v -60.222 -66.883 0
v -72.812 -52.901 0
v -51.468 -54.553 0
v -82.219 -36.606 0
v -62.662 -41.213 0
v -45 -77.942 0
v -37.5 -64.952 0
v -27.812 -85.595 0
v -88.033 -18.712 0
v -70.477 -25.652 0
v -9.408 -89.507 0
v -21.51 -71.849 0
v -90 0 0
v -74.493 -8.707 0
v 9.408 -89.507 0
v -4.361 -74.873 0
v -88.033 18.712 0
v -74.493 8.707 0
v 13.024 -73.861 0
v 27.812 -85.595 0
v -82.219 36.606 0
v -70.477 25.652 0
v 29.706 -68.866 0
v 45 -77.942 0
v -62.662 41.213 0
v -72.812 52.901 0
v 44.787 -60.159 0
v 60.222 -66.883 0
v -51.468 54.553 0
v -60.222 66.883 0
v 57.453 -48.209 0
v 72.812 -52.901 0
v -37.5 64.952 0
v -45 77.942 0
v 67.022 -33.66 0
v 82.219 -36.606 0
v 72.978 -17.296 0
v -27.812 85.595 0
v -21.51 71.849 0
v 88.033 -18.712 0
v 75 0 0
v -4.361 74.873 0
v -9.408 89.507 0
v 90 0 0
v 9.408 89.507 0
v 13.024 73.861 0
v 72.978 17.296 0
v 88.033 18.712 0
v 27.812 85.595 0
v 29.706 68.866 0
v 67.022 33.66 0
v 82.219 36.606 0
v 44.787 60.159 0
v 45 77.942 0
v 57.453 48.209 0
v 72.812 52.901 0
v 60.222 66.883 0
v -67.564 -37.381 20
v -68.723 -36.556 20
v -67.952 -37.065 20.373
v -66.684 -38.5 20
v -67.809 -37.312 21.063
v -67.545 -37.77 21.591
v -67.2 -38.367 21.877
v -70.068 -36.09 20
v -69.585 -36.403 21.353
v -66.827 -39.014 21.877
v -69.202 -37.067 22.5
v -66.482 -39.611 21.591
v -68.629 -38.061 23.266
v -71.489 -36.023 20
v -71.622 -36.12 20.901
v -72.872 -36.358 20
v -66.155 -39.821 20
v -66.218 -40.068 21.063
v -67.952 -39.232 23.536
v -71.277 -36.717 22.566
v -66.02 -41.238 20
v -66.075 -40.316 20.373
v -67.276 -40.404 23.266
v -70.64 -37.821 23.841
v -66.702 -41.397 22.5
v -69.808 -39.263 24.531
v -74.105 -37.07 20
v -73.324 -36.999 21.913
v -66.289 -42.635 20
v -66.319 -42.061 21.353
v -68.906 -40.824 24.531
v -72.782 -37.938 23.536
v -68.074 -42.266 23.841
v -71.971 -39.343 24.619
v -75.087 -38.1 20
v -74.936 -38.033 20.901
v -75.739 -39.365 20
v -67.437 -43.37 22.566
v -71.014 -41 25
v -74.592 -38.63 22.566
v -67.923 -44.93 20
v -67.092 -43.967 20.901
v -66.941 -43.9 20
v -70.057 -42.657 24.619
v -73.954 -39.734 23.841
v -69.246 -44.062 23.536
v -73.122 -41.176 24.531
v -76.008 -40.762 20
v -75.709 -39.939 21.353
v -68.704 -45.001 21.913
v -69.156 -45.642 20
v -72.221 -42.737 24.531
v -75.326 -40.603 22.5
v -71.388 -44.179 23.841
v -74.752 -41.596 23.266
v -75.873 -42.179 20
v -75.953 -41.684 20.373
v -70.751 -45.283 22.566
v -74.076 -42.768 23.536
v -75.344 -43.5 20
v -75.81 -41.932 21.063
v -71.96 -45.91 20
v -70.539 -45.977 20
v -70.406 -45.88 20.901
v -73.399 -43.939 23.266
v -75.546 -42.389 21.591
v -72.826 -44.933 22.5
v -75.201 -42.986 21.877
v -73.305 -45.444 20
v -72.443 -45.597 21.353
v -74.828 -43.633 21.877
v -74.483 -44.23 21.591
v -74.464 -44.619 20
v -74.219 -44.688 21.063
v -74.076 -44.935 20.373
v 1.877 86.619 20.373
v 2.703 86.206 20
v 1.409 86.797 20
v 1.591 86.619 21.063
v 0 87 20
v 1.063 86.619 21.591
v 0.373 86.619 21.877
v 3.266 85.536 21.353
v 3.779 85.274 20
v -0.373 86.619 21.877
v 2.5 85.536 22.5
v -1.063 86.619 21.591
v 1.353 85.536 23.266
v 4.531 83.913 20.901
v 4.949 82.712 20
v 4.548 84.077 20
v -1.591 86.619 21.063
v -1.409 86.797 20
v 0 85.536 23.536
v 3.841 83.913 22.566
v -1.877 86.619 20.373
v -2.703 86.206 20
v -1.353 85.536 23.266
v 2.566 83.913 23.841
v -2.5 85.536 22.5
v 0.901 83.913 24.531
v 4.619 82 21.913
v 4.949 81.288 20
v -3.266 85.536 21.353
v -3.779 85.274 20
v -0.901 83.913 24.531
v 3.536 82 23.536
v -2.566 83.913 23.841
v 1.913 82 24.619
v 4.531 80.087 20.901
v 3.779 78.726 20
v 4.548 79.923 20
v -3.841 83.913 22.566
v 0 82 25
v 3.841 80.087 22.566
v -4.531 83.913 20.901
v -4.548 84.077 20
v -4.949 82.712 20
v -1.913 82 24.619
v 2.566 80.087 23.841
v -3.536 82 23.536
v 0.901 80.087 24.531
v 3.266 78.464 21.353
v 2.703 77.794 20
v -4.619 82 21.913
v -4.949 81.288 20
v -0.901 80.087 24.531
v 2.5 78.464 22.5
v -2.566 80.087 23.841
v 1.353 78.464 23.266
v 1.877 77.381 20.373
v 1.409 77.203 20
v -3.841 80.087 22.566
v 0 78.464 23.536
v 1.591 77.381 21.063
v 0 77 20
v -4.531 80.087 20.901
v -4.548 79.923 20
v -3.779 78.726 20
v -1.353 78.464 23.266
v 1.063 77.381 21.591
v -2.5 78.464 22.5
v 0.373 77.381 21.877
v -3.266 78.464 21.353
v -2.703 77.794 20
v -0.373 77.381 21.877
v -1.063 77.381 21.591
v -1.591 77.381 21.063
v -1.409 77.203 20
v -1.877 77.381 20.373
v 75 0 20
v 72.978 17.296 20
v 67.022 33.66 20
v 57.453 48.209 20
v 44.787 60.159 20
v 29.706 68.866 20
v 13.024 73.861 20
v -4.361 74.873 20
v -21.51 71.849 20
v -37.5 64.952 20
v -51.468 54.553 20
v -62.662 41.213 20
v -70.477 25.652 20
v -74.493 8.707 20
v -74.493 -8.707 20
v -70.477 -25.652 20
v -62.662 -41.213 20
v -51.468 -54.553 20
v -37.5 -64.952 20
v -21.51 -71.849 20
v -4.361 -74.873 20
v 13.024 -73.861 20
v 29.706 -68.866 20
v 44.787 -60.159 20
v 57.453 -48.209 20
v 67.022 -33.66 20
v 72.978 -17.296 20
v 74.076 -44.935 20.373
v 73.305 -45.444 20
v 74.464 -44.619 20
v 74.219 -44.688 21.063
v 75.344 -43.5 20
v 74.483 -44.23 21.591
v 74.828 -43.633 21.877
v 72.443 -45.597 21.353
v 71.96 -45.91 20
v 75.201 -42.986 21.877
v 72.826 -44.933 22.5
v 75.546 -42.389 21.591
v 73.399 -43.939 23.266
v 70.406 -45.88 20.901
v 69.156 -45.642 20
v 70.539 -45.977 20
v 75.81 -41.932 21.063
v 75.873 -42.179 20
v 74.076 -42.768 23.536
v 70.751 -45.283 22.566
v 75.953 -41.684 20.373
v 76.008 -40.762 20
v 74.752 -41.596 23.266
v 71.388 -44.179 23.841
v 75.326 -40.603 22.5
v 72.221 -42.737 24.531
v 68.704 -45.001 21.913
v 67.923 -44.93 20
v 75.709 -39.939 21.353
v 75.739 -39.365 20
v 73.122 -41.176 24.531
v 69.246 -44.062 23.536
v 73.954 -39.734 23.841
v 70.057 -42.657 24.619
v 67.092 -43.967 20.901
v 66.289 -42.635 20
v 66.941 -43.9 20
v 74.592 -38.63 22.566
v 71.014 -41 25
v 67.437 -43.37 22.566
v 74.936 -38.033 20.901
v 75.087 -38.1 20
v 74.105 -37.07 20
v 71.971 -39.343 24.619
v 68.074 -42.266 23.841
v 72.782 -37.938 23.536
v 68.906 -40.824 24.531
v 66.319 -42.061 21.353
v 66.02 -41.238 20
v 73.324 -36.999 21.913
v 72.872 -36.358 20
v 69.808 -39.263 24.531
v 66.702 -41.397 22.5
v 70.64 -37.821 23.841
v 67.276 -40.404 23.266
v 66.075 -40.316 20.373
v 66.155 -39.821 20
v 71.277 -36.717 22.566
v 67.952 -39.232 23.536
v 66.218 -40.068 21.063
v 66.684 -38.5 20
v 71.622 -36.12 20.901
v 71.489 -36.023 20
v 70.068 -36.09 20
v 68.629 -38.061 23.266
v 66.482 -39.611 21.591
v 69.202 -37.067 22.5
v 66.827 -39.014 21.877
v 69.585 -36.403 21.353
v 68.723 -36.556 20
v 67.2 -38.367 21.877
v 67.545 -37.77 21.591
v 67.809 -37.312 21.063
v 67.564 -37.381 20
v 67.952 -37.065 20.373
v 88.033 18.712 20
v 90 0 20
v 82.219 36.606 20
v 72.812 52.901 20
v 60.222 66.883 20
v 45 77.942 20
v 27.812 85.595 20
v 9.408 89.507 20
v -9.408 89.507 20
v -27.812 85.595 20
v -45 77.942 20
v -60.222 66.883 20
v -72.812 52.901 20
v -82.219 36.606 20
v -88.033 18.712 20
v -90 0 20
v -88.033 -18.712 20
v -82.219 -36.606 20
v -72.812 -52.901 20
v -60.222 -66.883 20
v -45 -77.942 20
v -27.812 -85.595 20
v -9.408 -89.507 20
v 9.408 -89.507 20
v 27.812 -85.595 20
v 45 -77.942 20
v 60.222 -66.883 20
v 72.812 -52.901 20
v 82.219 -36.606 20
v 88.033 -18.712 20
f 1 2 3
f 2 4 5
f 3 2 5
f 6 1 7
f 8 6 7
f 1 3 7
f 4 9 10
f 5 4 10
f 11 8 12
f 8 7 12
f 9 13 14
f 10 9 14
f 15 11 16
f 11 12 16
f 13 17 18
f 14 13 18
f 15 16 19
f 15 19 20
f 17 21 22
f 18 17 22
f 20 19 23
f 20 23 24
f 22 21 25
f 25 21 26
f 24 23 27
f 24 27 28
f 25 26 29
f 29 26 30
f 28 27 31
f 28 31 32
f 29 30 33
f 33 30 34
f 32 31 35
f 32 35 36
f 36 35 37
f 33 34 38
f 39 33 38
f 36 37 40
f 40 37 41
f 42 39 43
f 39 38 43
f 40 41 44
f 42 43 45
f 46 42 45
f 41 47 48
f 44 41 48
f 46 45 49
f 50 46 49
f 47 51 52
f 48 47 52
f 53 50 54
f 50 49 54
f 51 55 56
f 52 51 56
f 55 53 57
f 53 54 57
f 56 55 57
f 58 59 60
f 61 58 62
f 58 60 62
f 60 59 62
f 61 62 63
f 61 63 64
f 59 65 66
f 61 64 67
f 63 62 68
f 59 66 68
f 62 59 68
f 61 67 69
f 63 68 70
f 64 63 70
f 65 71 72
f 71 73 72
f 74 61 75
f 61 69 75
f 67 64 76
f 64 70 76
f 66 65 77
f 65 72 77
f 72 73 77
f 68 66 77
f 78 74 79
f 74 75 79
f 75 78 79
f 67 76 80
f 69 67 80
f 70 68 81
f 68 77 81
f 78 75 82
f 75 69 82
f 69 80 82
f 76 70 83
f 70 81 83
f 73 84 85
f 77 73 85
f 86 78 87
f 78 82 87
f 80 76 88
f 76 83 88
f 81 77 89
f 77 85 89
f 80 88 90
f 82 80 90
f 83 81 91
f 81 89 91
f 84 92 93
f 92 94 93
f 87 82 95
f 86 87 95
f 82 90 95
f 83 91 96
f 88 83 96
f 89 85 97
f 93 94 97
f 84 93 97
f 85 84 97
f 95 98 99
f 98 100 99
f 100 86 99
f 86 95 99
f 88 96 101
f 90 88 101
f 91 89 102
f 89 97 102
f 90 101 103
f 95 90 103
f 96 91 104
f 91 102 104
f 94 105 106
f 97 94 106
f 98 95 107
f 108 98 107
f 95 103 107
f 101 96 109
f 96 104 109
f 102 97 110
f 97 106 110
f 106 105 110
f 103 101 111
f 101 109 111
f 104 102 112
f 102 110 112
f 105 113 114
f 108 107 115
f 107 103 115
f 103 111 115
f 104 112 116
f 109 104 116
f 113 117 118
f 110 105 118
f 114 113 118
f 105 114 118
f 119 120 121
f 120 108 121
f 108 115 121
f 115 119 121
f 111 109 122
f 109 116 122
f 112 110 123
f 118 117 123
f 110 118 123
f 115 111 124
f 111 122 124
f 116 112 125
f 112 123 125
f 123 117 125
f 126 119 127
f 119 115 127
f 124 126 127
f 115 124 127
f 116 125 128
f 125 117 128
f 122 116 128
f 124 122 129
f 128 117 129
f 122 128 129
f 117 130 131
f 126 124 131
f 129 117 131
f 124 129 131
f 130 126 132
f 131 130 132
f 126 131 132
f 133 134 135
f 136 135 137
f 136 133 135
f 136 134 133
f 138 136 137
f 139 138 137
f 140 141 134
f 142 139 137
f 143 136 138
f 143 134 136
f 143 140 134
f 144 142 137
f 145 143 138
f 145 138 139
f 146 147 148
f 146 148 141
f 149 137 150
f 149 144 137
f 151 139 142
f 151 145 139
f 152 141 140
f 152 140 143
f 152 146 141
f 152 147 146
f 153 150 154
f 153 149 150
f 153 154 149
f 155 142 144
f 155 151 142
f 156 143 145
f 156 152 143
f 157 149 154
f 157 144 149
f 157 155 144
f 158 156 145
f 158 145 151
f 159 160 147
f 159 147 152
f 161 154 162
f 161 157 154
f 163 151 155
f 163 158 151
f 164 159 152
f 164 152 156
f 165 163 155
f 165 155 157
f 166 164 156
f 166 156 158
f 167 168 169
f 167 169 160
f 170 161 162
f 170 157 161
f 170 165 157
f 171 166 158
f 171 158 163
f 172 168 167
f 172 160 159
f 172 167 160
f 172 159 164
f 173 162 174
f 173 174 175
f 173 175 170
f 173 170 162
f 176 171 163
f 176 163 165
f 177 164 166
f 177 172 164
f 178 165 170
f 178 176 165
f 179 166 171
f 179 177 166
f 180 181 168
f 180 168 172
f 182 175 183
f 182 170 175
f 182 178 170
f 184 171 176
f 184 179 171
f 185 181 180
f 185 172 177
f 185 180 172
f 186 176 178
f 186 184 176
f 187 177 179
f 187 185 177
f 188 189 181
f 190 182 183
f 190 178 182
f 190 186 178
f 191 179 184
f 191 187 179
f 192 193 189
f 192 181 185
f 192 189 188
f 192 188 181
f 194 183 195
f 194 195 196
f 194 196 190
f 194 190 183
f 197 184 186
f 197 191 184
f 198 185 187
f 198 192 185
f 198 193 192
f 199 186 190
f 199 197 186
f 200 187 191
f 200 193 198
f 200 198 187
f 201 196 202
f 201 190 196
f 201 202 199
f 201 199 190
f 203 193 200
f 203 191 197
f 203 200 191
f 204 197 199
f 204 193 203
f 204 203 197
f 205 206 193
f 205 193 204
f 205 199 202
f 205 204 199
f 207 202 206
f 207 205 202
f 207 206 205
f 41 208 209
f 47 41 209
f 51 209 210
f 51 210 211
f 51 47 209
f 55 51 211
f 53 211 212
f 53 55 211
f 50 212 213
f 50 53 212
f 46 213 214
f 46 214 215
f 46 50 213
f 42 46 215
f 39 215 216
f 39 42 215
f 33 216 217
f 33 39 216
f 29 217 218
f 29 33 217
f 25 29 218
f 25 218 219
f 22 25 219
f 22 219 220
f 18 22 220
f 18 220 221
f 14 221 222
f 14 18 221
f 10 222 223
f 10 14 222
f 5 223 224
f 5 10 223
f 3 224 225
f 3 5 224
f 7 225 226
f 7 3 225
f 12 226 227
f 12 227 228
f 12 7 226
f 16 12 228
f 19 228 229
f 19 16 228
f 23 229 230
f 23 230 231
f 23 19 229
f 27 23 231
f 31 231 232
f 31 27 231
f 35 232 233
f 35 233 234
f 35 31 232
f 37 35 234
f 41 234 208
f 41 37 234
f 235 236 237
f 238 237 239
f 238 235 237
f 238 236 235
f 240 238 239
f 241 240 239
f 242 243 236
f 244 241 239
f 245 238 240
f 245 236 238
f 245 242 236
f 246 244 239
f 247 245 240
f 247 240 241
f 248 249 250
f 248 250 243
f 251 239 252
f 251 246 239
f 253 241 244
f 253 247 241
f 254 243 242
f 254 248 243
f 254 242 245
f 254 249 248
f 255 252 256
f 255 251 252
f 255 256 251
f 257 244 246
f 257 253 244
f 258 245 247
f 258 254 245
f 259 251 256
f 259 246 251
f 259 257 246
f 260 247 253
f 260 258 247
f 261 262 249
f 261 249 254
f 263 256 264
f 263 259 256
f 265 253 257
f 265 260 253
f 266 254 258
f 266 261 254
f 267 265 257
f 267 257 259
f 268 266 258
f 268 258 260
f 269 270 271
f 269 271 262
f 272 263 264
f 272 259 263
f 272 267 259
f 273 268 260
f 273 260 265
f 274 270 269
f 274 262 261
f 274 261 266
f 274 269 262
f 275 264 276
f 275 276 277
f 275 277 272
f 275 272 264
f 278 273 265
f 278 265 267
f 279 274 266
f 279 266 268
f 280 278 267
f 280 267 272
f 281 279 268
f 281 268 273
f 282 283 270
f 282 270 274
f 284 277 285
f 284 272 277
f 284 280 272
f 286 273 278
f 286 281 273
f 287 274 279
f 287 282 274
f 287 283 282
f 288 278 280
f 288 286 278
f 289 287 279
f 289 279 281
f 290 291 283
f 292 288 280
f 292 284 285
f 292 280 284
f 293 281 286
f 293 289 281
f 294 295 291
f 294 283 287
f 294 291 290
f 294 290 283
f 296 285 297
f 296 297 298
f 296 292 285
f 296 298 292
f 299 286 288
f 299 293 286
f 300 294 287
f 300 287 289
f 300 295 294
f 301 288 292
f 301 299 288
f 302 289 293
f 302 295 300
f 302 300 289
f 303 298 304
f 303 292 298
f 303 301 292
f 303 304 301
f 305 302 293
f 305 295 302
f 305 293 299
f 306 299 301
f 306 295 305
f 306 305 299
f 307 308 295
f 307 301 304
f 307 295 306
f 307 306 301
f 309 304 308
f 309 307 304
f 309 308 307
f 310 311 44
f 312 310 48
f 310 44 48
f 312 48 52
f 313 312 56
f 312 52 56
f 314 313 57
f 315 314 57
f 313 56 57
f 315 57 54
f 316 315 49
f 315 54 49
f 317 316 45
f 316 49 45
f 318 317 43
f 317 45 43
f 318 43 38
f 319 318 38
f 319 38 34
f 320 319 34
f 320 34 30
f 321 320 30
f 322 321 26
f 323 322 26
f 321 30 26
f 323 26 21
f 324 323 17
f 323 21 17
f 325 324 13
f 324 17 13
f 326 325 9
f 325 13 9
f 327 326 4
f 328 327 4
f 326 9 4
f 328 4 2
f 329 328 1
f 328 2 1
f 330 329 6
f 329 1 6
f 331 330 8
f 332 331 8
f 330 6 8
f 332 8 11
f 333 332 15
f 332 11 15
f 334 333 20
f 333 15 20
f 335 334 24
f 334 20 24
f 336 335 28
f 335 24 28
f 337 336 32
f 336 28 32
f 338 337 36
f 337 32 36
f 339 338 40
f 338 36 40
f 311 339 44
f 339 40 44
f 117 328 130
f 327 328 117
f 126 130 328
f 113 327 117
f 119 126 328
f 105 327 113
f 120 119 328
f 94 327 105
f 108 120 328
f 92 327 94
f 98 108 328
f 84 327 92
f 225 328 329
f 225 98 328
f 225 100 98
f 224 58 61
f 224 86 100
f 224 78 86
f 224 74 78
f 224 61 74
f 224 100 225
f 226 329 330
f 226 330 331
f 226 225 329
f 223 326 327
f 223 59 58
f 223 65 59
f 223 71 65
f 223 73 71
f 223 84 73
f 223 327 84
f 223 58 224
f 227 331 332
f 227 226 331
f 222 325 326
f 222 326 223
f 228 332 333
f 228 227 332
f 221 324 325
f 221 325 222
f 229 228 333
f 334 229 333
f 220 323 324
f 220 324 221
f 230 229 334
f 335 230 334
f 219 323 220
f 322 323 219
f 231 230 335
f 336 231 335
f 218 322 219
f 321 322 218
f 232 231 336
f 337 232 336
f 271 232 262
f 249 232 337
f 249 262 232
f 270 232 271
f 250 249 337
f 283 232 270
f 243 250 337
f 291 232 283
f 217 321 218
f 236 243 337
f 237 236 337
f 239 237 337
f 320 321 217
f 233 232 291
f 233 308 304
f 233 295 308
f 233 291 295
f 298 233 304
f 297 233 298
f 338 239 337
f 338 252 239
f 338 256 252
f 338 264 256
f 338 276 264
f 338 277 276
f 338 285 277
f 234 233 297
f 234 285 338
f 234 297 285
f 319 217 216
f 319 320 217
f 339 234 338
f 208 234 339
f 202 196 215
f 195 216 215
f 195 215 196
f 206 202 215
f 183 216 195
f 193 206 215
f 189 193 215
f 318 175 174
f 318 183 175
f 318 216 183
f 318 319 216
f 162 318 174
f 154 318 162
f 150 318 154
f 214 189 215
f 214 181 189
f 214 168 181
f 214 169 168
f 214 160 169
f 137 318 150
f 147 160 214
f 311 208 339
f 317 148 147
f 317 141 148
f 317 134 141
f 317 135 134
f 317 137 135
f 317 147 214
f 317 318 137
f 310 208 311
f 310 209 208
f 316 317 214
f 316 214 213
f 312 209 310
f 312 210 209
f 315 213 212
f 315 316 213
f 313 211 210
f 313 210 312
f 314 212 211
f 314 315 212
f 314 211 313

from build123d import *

# Parameters (mm, degrees)
F0_R     = 90
F0_R_2   = 75
F1_DEPTH = 20


with BuildPart() as f1:
    # F0 (on Top) → F1 (new body)
    with BuildSketch(Plane.XY):
        Circle(F0_R)
        Circle(F0_R_2, mode=Mode.SUBTRACT)
    extrude(amount=F1_DEPTH)

    # F2 (on face) → F3 (revolve)
    with BuildSketch(Plane.XY.offset(20)):
        with BuildLine():
            Line((-75.3442101292, -43.5), (-66.6839560914, -38.5))
            ThreePointArc((-66.6839560914, -38.5), (-73.5140831103, -36.6698729811), (-75.3442101292, -43.5))
        make_face()
    revolve(axis=Axis((-77.9422863406, -45, 20), (0.8660254038, 0.5, 0)))

    # F4 (on face) → F5 (revolve)
    with BuildSketch(Plane.XY.offset(20)):
        with BuildLine():
            Line((66.6839560914, -38.5), (75.3442101292, -43.5))
            ThreePointArc((75.3442101292, -43.5), (73.5140831103, -36.6698729811), (66.6839560914, -38.5))
        make_face()
    revolve(axis=Axis((77.9422863406, -45, 20), (-0.8660254038, 0.5, 0)))

    # F6 (on face) → F7 (revolve)
    with BuildSketch(Plane.XY.offset(20)):
        with BuildLine():
            Line((0, 77), (0, 87))
            ThreePointArc((0, 87), (-5, 82), (0, 77))
        make_face()
    revolve(axis=Axis((0, 90, 20), (0, -1, 0)))


solid = f1.part
